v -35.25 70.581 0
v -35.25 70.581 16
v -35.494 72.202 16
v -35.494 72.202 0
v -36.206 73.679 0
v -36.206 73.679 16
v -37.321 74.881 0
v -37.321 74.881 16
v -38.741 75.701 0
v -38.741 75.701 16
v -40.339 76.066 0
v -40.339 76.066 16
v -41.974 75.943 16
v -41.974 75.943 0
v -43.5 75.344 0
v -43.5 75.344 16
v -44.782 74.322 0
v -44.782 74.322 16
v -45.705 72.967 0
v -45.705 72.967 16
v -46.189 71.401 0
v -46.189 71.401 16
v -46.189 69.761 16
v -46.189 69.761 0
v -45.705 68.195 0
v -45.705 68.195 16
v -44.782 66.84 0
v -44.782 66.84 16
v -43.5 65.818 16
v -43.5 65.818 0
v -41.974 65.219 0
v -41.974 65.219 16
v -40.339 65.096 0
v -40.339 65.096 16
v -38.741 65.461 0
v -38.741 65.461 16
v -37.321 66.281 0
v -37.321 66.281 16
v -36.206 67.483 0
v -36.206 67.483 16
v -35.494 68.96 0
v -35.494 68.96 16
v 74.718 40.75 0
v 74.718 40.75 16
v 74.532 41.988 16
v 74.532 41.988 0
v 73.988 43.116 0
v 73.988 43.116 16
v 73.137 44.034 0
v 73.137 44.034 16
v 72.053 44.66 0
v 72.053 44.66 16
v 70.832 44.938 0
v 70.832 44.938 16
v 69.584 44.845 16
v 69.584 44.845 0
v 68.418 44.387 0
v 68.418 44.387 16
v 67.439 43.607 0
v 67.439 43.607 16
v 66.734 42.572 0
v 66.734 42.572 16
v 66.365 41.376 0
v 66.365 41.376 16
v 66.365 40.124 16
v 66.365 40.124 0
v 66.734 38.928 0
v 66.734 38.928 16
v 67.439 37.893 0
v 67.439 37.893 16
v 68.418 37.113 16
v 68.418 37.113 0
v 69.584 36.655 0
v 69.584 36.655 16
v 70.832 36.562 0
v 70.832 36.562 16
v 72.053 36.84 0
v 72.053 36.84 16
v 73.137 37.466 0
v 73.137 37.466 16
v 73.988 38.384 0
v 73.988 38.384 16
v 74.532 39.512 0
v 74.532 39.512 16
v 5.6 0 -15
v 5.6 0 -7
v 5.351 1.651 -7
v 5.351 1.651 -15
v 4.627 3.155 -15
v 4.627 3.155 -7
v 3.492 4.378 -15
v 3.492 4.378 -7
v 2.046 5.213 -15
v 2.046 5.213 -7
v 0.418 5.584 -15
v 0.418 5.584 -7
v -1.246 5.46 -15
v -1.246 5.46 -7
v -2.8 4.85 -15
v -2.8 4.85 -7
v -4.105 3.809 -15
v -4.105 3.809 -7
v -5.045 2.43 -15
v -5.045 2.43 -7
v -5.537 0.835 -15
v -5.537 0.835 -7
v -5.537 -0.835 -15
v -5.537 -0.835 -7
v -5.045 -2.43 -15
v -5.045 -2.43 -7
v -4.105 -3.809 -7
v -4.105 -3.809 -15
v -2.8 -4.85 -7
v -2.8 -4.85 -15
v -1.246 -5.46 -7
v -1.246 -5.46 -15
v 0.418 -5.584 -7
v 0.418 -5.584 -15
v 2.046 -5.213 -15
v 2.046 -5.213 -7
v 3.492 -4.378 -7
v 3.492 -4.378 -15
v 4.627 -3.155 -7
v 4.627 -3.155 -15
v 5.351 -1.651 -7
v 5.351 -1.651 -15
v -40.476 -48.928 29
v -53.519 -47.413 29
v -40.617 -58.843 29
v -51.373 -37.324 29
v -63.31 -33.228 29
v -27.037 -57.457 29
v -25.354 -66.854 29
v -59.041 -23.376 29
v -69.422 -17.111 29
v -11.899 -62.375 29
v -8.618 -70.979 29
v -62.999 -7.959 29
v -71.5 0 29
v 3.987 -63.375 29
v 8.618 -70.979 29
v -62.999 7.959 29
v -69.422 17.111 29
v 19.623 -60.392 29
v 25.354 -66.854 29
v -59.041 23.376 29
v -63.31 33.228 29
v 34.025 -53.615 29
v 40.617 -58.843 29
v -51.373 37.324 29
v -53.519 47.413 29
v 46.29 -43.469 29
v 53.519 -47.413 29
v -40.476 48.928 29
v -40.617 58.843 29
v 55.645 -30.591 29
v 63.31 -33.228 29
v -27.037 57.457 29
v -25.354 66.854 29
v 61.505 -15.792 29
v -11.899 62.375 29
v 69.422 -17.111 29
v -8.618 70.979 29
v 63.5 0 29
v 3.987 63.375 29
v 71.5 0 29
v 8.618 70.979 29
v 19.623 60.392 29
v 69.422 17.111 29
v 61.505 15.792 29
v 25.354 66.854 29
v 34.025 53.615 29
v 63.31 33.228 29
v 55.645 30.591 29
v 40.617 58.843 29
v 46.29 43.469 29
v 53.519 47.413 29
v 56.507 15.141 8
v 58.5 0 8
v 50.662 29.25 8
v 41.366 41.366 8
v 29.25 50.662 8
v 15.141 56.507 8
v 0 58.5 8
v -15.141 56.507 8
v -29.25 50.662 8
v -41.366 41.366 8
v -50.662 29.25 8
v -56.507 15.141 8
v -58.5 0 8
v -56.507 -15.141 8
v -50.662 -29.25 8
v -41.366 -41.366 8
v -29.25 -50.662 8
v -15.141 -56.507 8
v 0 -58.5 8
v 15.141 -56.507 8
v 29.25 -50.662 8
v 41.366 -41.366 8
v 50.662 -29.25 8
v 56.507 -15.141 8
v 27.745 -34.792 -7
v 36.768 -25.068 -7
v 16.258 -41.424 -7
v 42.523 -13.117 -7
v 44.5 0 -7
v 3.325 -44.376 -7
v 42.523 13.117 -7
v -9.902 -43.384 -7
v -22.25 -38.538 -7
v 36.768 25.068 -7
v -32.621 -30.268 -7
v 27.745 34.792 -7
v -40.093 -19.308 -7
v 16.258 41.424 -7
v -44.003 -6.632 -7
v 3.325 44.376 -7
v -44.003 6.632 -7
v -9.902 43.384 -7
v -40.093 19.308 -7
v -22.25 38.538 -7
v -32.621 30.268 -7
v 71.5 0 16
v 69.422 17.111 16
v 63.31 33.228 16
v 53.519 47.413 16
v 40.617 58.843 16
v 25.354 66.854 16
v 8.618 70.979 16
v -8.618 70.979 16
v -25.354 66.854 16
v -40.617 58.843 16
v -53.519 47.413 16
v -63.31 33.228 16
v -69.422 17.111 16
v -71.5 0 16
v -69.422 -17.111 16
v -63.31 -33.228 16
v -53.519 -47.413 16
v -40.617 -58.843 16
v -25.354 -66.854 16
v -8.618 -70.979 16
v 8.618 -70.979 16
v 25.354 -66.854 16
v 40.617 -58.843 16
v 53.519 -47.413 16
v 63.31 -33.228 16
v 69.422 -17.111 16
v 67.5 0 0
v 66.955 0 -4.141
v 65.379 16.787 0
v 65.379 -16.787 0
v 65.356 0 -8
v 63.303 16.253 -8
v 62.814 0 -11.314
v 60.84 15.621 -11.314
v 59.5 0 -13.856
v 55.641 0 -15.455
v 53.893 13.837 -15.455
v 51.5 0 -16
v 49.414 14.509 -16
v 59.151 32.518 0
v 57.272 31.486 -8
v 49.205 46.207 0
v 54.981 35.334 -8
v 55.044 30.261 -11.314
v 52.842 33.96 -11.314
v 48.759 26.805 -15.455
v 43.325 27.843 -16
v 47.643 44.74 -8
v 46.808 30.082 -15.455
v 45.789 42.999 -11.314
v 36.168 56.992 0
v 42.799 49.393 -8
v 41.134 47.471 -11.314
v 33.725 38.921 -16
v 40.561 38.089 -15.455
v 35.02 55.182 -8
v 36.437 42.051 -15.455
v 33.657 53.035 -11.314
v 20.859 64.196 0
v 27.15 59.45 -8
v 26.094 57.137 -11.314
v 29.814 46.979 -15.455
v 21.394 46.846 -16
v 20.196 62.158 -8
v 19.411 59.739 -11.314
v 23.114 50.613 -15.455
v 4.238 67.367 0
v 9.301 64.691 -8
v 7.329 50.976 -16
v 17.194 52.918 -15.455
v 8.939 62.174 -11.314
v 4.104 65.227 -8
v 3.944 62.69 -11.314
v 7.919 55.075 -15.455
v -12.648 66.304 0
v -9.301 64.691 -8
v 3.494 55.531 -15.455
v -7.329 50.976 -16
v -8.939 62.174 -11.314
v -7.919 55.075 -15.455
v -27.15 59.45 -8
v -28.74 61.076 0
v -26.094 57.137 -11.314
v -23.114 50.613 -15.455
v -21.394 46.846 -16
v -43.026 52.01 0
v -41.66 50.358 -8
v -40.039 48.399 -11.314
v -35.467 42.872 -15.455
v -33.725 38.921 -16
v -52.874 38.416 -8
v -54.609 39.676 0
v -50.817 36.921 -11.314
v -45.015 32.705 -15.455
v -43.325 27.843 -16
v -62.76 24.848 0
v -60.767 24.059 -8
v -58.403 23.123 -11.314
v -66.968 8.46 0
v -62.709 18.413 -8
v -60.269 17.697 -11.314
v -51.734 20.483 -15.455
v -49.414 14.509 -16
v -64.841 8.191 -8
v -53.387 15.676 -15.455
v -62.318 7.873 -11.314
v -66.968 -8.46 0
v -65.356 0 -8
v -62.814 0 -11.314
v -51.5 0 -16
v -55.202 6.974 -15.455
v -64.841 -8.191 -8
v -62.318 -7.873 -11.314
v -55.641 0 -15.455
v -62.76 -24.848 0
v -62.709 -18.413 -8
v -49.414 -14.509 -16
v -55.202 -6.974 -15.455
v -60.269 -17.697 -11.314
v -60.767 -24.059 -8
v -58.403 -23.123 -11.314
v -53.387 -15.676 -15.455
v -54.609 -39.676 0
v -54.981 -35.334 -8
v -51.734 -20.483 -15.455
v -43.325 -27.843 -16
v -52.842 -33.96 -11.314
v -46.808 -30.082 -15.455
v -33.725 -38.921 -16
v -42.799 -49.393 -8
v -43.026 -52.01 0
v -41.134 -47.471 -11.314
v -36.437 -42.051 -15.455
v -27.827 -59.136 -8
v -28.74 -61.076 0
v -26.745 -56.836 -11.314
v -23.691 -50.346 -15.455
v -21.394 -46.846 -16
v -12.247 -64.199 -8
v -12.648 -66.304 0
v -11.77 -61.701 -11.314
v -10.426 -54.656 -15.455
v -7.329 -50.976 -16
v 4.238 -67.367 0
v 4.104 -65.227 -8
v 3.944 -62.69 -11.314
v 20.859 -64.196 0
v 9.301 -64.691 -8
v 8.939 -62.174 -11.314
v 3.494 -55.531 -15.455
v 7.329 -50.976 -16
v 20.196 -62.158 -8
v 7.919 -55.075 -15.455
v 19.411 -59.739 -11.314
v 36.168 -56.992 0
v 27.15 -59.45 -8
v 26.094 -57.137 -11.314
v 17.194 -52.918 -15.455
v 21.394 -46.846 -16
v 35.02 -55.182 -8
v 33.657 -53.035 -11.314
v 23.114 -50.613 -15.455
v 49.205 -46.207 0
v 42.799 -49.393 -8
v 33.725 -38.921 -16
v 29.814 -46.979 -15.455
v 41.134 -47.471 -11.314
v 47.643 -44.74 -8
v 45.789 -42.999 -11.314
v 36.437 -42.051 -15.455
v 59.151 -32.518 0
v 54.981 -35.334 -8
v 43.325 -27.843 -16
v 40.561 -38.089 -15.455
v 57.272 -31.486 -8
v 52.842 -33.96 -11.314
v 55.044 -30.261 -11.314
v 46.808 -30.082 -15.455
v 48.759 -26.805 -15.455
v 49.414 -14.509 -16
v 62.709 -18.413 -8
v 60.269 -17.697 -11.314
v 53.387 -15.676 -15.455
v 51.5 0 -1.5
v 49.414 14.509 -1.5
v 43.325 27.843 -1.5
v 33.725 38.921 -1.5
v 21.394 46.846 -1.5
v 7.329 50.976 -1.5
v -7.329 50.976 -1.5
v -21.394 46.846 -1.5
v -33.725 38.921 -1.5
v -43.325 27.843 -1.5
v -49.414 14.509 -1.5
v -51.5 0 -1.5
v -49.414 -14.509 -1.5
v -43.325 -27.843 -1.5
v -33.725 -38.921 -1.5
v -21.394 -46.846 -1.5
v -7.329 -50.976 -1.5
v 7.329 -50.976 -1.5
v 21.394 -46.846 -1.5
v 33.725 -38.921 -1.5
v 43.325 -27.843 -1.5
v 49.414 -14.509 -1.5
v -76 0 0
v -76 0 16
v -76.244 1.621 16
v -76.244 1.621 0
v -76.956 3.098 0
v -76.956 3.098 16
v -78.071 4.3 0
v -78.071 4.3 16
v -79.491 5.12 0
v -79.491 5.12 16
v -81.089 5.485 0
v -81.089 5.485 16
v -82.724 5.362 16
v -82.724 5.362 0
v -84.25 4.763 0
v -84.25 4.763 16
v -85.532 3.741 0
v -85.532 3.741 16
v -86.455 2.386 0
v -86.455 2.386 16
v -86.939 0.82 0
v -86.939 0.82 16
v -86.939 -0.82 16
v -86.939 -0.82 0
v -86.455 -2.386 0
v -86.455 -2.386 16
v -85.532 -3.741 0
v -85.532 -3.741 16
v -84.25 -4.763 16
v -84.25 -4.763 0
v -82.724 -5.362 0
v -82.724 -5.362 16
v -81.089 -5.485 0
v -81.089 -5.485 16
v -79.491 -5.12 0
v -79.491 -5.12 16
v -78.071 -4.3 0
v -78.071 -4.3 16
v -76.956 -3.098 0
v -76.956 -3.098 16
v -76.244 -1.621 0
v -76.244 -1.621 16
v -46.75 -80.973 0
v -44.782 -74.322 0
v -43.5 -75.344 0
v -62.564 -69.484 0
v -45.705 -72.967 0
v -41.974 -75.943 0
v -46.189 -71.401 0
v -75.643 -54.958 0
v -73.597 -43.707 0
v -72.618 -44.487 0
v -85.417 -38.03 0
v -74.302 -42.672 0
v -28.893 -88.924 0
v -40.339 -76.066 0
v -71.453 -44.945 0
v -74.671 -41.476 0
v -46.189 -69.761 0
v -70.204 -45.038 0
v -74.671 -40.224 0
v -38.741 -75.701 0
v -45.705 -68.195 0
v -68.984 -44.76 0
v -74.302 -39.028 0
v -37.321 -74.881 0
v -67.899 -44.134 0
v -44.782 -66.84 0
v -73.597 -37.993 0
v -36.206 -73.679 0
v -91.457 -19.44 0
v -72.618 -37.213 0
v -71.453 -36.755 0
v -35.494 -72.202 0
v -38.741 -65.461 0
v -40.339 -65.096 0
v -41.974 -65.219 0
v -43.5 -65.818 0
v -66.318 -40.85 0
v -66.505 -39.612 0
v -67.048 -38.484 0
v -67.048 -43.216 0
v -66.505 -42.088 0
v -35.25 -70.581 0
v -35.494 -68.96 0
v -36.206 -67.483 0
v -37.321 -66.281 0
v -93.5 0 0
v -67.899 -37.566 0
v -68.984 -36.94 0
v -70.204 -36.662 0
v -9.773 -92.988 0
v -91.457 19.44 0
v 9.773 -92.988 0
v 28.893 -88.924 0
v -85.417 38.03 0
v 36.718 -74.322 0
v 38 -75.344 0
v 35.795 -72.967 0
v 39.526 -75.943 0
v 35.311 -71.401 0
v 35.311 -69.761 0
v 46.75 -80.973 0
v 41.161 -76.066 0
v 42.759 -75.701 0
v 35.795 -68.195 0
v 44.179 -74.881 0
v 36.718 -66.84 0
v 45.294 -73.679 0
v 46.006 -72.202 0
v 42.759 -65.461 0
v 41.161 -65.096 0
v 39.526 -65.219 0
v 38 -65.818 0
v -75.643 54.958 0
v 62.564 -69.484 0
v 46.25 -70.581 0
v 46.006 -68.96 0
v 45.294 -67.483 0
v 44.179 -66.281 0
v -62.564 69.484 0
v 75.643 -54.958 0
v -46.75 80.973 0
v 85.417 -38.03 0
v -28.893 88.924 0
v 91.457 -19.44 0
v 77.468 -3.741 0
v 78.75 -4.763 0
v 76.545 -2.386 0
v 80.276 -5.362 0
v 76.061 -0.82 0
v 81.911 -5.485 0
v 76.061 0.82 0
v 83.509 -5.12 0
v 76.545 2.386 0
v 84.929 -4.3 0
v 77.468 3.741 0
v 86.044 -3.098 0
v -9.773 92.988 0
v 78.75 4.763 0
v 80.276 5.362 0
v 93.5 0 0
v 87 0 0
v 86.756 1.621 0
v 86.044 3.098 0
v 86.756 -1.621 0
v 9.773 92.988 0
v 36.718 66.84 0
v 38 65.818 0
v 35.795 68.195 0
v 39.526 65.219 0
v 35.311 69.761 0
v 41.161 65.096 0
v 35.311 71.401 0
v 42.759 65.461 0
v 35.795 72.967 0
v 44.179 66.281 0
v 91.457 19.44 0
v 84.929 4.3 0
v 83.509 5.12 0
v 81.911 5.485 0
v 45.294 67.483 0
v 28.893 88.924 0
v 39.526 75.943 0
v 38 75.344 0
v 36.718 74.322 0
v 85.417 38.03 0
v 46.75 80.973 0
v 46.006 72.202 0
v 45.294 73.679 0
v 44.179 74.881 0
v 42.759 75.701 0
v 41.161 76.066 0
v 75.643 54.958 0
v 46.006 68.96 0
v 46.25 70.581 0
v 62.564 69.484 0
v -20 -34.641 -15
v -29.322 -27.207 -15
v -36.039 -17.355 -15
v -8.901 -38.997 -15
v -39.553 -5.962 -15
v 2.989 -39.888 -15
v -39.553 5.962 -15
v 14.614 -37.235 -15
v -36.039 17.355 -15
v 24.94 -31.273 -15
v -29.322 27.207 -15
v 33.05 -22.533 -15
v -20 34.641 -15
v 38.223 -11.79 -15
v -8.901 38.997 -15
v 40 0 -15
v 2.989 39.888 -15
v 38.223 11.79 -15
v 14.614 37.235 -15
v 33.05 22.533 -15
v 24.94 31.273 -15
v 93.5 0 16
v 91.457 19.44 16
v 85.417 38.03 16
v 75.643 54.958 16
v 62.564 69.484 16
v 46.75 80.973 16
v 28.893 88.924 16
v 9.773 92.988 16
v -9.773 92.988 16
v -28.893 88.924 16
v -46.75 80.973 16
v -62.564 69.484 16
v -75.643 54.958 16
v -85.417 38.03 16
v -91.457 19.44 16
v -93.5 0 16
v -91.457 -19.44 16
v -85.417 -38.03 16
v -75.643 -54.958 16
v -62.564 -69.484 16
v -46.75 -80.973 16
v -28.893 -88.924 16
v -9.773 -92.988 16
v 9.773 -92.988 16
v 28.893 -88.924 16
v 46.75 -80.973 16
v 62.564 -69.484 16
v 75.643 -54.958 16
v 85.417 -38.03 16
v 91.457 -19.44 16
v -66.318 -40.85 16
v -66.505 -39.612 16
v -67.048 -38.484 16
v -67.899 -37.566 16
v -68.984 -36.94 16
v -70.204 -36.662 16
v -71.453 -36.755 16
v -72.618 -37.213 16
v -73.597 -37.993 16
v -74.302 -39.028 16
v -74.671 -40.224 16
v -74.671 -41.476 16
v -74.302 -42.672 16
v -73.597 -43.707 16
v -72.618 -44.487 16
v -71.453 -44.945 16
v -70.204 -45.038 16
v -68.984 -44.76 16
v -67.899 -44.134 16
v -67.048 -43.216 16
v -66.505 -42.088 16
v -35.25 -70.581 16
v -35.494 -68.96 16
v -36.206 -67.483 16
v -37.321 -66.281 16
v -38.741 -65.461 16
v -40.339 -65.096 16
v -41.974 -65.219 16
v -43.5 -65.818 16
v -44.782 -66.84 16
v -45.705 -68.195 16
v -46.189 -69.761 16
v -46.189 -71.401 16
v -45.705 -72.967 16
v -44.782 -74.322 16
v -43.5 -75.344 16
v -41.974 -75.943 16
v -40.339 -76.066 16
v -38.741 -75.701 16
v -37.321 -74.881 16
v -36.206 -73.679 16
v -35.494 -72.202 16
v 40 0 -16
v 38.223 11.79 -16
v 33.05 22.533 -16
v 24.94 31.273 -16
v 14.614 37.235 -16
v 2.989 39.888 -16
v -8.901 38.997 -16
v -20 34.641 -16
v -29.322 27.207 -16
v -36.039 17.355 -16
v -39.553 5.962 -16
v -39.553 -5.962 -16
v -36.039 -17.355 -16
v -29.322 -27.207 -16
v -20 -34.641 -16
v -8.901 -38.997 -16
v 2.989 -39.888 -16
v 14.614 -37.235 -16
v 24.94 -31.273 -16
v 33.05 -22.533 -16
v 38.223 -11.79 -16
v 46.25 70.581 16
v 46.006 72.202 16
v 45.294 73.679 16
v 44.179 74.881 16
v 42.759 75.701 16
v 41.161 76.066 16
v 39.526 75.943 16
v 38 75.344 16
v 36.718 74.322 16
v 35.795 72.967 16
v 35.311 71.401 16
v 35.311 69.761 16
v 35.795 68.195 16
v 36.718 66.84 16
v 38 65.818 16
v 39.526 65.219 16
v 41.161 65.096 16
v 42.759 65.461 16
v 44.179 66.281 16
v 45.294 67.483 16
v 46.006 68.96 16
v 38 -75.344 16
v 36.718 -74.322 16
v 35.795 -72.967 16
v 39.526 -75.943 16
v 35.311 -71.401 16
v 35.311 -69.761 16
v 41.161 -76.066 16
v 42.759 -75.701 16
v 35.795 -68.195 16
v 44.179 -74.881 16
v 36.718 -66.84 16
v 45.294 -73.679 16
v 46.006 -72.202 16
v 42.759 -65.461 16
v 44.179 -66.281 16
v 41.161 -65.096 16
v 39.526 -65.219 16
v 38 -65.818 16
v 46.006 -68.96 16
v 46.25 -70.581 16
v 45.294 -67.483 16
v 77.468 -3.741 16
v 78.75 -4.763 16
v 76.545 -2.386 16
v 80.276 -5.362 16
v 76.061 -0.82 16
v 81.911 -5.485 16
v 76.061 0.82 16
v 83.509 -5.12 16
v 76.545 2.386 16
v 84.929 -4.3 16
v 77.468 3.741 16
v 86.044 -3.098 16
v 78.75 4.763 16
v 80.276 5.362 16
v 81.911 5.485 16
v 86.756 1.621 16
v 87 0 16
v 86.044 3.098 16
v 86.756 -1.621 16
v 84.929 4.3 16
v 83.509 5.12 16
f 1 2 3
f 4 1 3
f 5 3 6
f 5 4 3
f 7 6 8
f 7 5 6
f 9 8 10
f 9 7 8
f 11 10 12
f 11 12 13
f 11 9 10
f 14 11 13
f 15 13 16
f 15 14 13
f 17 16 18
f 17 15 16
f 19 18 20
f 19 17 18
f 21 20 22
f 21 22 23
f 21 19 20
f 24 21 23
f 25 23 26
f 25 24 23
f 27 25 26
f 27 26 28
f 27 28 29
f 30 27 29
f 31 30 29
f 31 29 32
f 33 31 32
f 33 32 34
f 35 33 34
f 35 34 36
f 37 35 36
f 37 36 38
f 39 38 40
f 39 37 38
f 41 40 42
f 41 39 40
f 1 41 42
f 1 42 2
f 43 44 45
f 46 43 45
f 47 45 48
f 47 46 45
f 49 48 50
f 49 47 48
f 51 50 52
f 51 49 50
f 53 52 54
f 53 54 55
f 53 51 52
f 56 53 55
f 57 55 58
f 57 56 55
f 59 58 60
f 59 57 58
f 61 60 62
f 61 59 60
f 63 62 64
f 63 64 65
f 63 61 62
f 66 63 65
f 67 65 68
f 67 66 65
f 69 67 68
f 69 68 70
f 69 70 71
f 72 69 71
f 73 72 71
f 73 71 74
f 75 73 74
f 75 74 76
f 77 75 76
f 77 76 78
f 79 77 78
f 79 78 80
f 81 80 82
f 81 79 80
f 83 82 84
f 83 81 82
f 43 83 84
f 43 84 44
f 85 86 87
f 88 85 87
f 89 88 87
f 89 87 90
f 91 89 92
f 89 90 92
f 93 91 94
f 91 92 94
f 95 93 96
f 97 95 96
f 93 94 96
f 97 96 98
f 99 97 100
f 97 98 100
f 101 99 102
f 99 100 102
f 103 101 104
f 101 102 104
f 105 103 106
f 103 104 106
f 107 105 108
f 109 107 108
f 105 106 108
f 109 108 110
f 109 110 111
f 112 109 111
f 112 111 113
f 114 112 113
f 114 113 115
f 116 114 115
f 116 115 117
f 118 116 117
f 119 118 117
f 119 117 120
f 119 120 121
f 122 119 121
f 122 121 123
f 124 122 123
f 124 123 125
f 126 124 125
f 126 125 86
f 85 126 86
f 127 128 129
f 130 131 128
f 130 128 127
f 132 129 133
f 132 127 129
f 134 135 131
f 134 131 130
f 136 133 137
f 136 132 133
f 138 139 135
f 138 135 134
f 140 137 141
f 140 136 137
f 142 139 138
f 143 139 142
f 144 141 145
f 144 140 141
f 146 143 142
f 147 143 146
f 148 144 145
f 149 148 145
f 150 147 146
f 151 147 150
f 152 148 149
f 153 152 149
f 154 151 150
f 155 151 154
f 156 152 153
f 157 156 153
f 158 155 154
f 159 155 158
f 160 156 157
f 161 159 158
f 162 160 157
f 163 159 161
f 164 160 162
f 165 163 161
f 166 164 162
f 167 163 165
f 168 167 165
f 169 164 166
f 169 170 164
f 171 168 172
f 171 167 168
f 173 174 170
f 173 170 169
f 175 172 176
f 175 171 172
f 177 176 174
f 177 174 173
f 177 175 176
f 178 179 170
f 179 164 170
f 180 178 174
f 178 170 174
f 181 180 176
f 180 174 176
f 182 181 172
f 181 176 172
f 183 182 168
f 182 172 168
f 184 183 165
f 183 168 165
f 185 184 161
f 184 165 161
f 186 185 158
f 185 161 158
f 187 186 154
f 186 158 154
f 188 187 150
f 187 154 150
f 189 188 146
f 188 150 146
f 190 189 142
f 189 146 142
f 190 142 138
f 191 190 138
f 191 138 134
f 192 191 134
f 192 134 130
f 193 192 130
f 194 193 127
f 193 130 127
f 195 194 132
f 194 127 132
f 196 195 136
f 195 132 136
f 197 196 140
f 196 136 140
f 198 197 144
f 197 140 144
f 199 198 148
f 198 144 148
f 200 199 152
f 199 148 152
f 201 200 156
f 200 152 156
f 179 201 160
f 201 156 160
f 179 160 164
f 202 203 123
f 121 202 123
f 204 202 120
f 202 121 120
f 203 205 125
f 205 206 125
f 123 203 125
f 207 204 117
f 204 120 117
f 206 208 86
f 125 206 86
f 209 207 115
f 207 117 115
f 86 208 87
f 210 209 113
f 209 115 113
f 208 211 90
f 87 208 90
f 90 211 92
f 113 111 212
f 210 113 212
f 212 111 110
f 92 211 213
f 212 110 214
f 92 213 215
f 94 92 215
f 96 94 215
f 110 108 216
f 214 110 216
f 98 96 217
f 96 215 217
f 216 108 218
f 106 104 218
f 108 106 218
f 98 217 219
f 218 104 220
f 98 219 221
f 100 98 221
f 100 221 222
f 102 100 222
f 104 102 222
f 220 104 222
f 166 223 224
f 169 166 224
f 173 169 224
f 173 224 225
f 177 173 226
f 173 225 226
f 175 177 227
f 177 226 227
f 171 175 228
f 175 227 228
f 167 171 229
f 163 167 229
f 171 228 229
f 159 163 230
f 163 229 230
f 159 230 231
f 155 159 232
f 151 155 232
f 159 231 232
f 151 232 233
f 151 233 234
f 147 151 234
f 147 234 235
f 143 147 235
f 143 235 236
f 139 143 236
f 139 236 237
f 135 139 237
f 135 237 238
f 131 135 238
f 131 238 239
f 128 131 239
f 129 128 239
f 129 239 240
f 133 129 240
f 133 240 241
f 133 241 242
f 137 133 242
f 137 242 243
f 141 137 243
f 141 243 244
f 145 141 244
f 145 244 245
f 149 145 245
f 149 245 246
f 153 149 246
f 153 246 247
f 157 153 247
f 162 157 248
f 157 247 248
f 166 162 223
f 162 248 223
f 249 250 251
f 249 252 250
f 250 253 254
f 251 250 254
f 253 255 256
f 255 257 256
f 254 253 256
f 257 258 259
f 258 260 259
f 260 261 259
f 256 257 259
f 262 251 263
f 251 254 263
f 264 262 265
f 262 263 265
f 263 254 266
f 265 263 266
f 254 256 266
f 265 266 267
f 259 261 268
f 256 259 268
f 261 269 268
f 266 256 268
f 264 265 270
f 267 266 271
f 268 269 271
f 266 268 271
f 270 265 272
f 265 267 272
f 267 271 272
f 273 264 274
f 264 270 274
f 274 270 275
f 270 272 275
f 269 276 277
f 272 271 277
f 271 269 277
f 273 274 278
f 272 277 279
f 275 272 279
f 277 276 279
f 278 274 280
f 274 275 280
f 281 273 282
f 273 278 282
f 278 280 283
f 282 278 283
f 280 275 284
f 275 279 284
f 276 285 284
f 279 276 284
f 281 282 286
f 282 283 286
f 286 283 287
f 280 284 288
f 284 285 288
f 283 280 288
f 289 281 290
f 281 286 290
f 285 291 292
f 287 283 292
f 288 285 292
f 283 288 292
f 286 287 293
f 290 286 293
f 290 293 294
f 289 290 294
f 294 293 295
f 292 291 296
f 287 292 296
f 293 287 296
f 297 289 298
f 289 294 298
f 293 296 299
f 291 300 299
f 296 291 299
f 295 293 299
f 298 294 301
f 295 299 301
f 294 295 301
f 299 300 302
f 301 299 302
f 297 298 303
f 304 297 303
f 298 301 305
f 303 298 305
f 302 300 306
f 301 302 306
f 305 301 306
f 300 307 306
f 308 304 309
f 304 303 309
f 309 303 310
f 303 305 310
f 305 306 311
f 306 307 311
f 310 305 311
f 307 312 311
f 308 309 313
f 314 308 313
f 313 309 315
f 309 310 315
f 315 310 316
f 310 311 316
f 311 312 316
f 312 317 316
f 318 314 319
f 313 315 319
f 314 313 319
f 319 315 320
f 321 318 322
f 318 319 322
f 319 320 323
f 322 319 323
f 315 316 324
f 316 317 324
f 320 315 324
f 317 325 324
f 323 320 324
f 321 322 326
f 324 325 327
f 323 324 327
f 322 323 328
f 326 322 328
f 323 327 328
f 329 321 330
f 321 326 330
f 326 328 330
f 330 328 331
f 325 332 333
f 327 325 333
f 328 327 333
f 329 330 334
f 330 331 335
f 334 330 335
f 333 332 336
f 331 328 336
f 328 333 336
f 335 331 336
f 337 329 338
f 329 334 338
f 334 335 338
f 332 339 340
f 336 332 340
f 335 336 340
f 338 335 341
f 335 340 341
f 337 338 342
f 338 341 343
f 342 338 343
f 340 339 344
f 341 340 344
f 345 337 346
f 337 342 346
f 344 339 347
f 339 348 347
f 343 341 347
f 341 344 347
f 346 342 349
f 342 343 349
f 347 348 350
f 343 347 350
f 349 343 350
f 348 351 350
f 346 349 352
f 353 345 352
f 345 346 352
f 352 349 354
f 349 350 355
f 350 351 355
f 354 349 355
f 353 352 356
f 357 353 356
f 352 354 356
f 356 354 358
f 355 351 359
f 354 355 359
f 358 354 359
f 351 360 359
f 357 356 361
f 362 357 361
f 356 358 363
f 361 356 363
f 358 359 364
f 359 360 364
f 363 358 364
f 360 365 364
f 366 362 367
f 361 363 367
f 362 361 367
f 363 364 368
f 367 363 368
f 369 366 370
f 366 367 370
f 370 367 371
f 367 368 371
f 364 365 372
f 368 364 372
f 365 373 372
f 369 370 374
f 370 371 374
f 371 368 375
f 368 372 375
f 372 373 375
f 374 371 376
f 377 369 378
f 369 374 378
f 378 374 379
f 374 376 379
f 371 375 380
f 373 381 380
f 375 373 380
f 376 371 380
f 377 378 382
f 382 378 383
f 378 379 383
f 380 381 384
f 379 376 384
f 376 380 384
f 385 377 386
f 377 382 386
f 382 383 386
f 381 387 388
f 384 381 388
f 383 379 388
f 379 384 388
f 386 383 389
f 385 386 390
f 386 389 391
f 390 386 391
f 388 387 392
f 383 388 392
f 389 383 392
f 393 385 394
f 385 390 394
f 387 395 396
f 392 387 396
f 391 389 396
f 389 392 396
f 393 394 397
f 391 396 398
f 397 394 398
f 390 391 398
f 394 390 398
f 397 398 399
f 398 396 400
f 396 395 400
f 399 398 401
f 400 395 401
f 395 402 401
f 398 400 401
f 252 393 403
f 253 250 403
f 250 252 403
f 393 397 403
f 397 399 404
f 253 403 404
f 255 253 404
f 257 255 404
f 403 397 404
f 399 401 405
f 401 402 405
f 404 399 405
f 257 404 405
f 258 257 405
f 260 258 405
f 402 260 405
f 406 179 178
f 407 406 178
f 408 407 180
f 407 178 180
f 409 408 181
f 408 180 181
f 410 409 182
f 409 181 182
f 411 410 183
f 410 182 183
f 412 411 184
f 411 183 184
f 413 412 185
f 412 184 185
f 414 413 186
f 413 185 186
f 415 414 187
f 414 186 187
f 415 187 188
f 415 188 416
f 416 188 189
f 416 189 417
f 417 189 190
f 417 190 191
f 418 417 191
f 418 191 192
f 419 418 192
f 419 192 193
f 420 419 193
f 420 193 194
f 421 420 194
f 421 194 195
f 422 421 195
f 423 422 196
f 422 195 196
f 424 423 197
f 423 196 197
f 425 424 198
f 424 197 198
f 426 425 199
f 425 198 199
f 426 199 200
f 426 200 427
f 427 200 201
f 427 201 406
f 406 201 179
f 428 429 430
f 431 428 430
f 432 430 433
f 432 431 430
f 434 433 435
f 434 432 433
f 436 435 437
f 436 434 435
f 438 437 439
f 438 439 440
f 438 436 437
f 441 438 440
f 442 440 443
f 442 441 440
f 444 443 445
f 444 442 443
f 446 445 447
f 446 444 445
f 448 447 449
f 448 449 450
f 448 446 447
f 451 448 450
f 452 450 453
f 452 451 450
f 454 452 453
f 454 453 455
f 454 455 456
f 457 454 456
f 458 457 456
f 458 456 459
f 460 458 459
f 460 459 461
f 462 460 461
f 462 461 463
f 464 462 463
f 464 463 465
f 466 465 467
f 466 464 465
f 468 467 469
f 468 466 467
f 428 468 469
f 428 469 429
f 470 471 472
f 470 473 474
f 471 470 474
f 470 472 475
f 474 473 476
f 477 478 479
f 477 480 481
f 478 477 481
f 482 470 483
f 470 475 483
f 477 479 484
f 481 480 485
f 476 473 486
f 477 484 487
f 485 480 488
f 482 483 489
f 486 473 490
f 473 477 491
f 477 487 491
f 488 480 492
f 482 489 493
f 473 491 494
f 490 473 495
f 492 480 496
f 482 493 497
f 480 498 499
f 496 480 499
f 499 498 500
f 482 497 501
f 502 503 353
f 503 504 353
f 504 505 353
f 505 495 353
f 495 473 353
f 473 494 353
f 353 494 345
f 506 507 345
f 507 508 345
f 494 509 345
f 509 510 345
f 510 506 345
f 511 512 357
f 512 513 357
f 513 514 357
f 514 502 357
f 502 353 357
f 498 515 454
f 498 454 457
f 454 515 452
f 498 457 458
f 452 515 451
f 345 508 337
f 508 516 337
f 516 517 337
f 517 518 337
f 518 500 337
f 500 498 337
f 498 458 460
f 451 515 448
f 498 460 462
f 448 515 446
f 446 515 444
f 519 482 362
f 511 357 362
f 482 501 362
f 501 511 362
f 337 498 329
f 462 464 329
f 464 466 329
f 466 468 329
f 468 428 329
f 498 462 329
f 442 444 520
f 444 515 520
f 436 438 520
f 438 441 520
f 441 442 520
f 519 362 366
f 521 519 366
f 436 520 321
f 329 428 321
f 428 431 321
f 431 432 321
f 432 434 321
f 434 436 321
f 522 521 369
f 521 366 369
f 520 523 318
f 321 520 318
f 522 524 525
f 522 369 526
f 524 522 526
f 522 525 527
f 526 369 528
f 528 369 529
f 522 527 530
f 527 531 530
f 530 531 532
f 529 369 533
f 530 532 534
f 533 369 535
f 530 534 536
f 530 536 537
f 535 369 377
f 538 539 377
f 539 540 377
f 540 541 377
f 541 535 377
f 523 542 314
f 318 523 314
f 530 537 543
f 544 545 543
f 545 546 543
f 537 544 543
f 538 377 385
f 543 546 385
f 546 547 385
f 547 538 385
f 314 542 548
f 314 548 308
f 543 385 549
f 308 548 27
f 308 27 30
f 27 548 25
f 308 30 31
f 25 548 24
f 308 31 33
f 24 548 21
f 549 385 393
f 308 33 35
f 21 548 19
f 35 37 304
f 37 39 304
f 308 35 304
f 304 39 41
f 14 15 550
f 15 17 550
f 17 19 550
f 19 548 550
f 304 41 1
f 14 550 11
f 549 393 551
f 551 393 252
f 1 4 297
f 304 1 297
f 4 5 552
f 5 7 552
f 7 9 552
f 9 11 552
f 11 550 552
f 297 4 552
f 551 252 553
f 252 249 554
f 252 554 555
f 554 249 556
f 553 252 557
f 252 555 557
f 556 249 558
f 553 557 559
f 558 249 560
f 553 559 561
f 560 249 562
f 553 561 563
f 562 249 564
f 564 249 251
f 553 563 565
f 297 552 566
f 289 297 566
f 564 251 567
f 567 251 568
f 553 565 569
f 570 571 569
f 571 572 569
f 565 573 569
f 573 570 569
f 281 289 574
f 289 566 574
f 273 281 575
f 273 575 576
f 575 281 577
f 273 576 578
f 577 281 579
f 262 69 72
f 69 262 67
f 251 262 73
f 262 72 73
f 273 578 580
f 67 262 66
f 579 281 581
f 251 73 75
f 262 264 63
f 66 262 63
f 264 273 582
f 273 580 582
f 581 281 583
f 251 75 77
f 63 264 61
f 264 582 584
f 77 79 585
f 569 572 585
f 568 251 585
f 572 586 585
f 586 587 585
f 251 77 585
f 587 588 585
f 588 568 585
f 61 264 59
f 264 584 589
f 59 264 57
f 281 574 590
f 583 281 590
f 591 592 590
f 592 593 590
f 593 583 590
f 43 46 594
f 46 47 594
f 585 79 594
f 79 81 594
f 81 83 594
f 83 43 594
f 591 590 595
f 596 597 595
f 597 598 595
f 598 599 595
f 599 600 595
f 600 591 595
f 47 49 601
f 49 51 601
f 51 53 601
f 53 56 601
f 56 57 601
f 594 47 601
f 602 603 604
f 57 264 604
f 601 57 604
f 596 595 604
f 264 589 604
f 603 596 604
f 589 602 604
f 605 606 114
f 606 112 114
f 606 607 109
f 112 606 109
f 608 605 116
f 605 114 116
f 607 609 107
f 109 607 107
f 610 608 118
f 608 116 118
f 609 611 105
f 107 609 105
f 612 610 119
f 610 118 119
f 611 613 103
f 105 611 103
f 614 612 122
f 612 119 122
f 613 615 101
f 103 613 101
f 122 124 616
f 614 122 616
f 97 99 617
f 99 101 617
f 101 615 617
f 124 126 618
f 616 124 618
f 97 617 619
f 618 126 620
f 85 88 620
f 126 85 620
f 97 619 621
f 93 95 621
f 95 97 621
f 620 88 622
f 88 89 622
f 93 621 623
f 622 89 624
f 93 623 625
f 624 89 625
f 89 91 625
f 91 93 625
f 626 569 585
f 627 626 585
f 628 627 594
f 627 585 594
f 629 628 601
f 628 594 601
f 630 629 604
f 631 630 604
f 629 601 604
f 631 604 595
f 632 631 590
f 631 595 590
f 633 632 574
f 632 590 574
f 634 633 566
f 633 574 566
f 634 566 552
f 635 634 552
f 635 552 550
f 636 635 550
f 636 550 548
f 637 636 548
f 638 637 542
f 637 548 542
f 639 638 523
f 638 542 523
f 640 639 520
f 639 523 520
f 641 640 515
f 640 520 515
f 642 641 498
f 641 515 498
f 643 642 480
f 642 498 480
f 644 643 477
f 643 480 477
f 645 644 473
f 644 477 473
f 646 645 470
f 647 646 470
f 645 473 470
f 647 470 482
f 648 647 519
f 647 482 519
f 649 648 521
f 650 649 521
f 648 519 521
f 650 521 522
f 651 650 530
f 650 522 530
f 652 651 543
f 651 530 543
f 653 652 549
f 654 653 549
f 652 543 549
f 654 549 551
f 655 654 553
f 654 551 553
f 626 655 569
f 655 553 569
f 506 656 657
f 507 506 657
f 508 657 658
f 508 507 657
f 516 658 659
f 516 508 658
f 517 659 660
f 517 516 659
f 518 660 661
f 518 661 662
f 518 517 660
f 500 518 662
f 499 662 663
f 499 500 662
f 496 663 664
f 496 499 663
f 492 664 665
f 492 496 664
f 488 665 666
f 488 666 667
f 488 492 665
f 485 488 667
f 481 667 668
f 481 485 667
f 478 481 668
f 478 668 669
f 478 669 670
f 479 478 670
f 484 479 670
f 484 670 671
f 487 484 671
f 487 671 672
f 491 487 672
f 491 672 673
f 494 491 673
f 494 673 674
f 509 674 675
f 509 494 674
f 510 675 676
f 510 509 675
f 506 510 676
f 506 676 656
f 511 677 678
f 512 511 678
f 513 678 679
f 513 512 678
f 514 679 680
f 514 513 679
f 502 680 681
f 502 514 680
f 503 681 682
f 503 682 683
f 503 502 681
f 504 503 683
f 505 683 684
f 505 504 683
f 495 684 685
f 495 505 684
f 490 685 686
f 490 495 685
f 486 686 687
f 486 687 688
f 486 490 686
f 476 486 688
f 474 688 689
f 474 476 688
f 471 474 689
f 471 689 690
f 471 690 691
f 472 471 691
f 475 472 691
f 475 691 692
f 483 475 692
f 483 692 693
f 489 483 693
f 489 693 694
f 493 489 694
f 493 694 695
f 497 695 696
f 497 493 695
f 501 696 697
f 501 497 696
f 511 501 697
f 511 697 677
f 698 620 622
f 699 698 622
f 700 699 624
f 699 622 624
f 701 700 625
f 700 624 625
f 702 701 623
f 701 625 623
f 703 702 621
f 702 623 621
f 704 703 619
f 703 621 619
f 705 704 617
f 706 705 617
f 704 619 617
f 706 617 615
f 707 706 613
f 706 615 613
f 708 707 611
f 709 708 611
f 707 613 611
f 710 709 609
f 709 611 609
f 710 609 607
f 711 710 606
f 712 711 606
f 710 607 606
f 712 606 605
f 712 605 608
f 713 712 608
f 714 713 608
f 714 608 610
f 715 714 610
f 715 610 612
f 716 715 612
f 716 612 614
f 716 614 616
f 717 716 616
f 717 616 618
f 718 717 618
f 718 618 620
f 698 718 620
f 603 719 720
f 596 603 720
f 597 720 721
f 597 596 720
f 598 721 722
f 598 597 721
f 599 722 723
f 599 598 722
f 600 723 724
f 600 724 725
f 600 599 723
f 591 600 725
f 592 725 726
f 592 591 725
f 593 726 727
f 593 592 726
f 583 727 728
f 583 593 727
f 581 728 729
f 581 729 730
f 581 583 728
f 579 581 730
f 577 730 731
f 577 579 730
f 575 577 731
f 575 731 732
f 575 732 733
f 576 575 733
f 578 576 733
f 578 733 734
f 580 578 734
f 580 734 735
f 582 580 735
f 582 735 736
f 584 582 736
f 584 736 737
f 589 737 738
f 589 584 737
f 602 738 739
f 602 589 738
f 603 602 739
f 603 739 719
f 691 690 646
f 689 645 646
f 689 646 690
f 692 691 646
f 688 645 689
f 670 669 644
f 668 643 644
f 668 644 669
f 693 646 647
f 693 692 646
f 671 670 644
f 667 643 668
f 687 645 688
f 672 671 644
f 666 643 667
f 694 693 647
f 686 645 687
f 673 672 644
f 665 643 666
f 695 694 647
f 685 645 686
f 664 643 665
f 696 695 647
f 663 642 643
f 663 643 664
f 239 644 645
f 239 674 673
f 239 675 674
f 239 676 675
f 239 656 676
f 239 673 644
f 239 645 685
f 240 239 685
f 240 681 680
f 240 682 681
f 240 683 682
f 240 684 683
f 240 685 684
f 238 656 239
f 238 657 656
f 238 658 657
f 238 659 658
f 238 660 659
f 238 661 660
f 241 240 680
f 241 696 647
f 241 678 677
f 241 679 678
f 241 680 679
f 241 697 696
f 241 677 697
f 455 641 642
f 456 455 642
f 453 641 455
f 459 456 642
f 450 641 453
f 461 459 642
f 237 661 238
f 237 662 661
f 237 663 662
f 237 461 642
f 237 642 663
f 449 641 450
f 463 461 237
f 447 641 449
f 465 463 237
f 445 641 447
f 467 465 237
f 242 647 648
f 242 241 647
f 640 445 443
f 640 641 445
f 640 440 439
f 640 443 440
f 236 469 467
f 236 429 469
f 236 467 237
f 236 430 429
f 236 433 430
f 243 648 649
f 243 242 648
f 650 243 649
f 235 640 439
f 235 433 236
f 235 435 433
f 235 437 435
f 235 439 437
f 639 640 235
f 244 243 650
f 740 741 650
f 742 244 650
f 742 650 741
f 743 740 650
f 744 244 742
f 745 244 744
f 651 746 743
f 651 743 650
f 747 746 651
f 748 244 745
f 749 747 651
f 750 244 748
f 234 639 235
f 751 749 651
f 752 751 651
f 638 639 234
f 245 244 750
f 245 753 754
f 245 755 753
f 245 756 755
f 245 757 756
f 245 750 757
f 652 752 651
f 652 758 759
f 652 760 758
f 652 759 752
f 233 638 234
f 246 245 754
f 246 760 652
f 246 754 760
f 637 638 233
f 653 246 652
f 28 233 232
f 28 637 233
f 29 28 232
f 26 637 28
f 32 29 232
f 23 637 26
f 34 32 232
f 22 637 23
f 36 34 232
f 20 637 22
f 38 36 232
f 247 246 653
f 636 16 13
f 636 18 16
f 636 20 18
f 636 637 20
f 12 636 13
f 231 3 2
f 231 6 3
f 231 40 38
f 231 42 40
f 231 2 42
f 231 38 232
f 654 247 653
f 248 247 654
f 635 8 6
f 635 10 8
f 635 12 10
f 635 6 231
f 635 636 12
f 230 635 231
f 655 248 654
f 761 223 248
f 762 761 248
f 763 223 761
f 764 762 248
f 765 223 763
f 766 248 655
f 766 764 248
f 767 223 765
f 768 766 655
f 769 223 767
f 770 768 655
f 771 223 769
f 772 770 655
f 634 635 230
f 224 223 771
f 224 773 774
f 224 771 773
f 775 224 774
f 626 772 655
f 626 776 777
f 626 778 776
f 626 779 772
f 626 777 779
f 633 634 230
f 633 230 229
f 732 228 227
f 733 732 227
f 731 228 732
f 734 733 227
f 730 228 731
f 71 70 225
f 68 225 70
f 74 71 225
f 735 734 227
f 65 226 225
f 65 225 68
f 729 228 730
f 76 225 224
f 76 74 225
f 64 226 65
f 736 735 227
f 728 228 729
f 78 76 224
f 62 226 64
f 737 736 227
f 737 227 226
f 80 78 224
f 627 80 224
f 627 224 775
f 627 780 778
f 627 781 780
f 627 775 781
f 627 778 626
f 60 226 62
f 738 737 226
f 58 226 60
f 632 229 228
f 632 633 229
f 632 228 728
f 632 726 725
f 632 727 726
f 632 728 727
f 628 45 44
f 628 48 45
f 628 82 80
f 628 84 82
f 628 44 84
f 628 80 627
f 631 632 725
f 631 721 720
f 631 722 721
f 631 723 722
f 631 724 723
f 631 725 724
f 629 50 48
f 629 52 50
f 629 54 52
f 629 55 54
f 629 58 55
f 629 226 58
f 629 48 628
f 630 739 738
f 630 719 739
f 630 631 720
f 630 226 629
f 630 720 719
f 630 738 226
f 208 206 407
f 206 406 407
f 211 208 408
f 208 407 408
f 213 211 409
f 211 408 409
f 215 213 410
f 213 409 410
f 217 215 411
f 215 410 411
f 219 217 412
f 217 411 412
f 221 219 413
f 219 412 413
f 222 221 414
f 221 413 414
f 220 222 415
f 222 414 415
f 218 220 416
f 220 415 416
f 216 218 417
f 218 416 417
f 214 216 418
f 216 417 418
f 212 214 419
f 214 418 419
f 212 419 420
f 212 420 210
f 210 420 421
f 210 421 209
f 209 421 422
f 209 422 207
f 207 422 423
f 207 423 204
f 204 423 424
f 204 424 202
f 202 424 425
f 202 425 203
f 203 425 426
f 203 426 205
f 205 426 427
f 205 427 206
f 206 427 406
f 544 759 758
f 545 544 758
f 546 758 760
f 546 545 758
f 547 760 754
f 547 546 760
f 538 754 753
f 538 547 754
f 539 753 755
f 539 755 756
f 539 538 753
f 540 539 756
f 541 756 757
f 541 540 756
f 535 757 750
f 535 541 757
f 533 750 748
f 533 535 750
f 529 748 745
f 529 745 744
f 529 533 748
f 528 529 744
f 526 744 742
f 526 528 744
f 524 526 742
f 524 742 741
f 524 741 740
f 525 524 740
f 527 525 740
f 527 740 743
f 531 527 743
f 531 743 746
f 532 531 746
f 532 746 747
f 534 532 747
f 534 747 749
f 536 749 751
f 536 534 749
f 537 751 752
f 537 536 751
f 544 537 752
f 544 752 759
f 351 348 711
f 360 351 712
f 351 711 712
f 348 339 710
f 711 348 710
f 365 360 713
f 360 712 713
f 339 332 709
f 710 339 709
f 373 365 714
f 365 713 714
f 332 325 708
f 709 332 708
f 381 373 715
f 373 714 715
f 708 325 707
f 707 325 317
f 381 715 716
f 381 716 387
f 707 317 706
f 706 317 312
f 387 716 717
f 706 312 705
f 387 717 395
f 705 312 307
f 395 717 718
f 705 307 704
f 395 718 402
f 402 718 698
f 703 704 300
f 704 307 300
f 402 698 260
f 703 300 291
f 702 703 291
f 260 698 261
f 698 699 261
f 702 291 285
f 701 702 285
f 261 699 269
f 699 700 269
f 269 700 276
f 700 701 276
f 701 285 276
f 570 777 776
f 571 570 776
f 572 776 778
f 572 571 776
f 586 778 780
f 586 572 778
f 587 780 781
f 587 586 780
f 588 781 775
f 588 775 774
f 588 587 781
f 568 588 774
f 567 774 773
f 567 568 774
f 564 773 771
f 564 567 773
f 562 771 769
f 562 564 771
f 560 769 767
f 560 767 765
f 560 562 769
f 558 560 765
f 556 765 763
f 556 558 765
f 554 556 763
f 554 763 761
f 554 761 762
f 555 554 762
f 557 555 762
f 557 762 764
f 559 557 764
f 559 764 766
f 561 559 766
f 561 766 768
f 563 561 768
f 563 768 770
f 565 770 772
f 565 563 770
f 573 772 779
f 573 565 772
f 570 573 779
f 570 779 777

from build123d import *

# Parameters (mm, degrees)
F0_R     = 93.5
F0_R_2   = 5.5
F0_R_3   = 4.2
F0_R_4   = 71.5
F1_DEPTH = 16
F0_R_5   = 67.5
F0_R_6   = 40
F2_DEPTH = 29
F3_DEPTH = 16
F4_R     = 15.99999
F0_R_7   = 5.6
F5_DEPTH = 15


# Not quite as in the source:
# - a fillet or chamfer is up to 0.001 mm smaller than in the source, because OpenCascade refuses the exact size


with BuildPart() as f1:
    # F0 (on Top) → F1 (new body)
    with BuildSketch(Plane.XY):
        Circle(F0_R)
        with Locations((-40.75, -70.5810704084)):
            Circle(F0_R_2, mode=Mode.SUBTRACT)
        with Locations((-70.5181, -40.85)):
            Circle(F0_R_3, mode=Mode.SUBTRACT)
        with Locations((-81.5, 0)):
            Circle(F0_R_2, mode=Mode.SUBTRACT)
        Circle(F0_R_4, mode=Mode.SUBTRACT)
        with Locations((40.75, -70.5810704084)):
            Circle(F0_R_2, mode=Mode.SUBTRACT)
        with Locations((81.5, 0)):
            Circle(F0_R_2, mode=Mode.SUBTRACT)
        with Locations((-40.75, 70.5810704084)):
            Circle(F0_R_2, mode=Mode.SUBTRACT)
        with Locations((70.5181, 40.75)):
            Circle(F0_R_3, mode=Mode.SUBTRACT)
        with Locations((40.75, 70.5810704084)):
            Circle(F0_R_2, mode=Mode.SUBTRACT)
    extrude(amount=F1_DEPTH)

    # F0 (on Top) → F2 (join)
    with BuildSketch(Plane.XY):
        Circle(F0_R_4)
        Circle(F0_R_5, mode=Mode.SUBTRACT)
        Circle(F0_R_5)
        Circle(F0_R_6, mode=Mode.SUBTRACT)
    extrude(amount=F2_DEPTH)

    # F0 (on Top) → F3 (join)
    with BuildSketch(Plane.XY):
        Circle(F0_R_5)
        Circle(F0_R_6, mode=Mode.SUBTRACT)
    extrude(amount=-F3_DEPTH)

    # F4 (radius 16 in the source; OpenCascade refuses exactly that, so slightly less here)
    f4_edges = [f1.edges().sort_by_distance(p)[0] for p in [
        (-67.5, 0, -16),
    ]]
    fillet(f4_edges, radius=F4_R)

    # F0 (on Top) → F5 (join)
    with BuildSketch(Plane.XY):
        Circle(F0_R_6)
        Circle(F0_R_7, mode=Mode.SUBTRACT)
    extrude(amount=-F5_DEPTH)

    # F6 (on Front) → F7 (revolve, cut)
    with BuildSketch(Plane.XZ):
        Polygon((0, 29.0000022426), (0, 8.0000022426), (58.5, 8.0000022426), (63.5, 29.0000022426), align=None)
    revolve(axis=Axis((0, 0, 18.5000022426), (0, 0, 1)), mode=Mode.SUBTRACT)

    # F8 (on Front) → F9 (revolve, cut)
    with BuildSketch(Plane.XZ):
        Polygon((44.5, -6.9999977574), (51.4999961092, -1.4999977574), (58.5, 8.0000022426), (0, 8.0000022426), (0, -1.4999977574), (0, -6.9999977574), align=None)
    revolve(axis=Axis((0, 0, 3.2500022426), (0, 0, 1)), mode=Mode.SUBTRACT)


solid = f1.part
